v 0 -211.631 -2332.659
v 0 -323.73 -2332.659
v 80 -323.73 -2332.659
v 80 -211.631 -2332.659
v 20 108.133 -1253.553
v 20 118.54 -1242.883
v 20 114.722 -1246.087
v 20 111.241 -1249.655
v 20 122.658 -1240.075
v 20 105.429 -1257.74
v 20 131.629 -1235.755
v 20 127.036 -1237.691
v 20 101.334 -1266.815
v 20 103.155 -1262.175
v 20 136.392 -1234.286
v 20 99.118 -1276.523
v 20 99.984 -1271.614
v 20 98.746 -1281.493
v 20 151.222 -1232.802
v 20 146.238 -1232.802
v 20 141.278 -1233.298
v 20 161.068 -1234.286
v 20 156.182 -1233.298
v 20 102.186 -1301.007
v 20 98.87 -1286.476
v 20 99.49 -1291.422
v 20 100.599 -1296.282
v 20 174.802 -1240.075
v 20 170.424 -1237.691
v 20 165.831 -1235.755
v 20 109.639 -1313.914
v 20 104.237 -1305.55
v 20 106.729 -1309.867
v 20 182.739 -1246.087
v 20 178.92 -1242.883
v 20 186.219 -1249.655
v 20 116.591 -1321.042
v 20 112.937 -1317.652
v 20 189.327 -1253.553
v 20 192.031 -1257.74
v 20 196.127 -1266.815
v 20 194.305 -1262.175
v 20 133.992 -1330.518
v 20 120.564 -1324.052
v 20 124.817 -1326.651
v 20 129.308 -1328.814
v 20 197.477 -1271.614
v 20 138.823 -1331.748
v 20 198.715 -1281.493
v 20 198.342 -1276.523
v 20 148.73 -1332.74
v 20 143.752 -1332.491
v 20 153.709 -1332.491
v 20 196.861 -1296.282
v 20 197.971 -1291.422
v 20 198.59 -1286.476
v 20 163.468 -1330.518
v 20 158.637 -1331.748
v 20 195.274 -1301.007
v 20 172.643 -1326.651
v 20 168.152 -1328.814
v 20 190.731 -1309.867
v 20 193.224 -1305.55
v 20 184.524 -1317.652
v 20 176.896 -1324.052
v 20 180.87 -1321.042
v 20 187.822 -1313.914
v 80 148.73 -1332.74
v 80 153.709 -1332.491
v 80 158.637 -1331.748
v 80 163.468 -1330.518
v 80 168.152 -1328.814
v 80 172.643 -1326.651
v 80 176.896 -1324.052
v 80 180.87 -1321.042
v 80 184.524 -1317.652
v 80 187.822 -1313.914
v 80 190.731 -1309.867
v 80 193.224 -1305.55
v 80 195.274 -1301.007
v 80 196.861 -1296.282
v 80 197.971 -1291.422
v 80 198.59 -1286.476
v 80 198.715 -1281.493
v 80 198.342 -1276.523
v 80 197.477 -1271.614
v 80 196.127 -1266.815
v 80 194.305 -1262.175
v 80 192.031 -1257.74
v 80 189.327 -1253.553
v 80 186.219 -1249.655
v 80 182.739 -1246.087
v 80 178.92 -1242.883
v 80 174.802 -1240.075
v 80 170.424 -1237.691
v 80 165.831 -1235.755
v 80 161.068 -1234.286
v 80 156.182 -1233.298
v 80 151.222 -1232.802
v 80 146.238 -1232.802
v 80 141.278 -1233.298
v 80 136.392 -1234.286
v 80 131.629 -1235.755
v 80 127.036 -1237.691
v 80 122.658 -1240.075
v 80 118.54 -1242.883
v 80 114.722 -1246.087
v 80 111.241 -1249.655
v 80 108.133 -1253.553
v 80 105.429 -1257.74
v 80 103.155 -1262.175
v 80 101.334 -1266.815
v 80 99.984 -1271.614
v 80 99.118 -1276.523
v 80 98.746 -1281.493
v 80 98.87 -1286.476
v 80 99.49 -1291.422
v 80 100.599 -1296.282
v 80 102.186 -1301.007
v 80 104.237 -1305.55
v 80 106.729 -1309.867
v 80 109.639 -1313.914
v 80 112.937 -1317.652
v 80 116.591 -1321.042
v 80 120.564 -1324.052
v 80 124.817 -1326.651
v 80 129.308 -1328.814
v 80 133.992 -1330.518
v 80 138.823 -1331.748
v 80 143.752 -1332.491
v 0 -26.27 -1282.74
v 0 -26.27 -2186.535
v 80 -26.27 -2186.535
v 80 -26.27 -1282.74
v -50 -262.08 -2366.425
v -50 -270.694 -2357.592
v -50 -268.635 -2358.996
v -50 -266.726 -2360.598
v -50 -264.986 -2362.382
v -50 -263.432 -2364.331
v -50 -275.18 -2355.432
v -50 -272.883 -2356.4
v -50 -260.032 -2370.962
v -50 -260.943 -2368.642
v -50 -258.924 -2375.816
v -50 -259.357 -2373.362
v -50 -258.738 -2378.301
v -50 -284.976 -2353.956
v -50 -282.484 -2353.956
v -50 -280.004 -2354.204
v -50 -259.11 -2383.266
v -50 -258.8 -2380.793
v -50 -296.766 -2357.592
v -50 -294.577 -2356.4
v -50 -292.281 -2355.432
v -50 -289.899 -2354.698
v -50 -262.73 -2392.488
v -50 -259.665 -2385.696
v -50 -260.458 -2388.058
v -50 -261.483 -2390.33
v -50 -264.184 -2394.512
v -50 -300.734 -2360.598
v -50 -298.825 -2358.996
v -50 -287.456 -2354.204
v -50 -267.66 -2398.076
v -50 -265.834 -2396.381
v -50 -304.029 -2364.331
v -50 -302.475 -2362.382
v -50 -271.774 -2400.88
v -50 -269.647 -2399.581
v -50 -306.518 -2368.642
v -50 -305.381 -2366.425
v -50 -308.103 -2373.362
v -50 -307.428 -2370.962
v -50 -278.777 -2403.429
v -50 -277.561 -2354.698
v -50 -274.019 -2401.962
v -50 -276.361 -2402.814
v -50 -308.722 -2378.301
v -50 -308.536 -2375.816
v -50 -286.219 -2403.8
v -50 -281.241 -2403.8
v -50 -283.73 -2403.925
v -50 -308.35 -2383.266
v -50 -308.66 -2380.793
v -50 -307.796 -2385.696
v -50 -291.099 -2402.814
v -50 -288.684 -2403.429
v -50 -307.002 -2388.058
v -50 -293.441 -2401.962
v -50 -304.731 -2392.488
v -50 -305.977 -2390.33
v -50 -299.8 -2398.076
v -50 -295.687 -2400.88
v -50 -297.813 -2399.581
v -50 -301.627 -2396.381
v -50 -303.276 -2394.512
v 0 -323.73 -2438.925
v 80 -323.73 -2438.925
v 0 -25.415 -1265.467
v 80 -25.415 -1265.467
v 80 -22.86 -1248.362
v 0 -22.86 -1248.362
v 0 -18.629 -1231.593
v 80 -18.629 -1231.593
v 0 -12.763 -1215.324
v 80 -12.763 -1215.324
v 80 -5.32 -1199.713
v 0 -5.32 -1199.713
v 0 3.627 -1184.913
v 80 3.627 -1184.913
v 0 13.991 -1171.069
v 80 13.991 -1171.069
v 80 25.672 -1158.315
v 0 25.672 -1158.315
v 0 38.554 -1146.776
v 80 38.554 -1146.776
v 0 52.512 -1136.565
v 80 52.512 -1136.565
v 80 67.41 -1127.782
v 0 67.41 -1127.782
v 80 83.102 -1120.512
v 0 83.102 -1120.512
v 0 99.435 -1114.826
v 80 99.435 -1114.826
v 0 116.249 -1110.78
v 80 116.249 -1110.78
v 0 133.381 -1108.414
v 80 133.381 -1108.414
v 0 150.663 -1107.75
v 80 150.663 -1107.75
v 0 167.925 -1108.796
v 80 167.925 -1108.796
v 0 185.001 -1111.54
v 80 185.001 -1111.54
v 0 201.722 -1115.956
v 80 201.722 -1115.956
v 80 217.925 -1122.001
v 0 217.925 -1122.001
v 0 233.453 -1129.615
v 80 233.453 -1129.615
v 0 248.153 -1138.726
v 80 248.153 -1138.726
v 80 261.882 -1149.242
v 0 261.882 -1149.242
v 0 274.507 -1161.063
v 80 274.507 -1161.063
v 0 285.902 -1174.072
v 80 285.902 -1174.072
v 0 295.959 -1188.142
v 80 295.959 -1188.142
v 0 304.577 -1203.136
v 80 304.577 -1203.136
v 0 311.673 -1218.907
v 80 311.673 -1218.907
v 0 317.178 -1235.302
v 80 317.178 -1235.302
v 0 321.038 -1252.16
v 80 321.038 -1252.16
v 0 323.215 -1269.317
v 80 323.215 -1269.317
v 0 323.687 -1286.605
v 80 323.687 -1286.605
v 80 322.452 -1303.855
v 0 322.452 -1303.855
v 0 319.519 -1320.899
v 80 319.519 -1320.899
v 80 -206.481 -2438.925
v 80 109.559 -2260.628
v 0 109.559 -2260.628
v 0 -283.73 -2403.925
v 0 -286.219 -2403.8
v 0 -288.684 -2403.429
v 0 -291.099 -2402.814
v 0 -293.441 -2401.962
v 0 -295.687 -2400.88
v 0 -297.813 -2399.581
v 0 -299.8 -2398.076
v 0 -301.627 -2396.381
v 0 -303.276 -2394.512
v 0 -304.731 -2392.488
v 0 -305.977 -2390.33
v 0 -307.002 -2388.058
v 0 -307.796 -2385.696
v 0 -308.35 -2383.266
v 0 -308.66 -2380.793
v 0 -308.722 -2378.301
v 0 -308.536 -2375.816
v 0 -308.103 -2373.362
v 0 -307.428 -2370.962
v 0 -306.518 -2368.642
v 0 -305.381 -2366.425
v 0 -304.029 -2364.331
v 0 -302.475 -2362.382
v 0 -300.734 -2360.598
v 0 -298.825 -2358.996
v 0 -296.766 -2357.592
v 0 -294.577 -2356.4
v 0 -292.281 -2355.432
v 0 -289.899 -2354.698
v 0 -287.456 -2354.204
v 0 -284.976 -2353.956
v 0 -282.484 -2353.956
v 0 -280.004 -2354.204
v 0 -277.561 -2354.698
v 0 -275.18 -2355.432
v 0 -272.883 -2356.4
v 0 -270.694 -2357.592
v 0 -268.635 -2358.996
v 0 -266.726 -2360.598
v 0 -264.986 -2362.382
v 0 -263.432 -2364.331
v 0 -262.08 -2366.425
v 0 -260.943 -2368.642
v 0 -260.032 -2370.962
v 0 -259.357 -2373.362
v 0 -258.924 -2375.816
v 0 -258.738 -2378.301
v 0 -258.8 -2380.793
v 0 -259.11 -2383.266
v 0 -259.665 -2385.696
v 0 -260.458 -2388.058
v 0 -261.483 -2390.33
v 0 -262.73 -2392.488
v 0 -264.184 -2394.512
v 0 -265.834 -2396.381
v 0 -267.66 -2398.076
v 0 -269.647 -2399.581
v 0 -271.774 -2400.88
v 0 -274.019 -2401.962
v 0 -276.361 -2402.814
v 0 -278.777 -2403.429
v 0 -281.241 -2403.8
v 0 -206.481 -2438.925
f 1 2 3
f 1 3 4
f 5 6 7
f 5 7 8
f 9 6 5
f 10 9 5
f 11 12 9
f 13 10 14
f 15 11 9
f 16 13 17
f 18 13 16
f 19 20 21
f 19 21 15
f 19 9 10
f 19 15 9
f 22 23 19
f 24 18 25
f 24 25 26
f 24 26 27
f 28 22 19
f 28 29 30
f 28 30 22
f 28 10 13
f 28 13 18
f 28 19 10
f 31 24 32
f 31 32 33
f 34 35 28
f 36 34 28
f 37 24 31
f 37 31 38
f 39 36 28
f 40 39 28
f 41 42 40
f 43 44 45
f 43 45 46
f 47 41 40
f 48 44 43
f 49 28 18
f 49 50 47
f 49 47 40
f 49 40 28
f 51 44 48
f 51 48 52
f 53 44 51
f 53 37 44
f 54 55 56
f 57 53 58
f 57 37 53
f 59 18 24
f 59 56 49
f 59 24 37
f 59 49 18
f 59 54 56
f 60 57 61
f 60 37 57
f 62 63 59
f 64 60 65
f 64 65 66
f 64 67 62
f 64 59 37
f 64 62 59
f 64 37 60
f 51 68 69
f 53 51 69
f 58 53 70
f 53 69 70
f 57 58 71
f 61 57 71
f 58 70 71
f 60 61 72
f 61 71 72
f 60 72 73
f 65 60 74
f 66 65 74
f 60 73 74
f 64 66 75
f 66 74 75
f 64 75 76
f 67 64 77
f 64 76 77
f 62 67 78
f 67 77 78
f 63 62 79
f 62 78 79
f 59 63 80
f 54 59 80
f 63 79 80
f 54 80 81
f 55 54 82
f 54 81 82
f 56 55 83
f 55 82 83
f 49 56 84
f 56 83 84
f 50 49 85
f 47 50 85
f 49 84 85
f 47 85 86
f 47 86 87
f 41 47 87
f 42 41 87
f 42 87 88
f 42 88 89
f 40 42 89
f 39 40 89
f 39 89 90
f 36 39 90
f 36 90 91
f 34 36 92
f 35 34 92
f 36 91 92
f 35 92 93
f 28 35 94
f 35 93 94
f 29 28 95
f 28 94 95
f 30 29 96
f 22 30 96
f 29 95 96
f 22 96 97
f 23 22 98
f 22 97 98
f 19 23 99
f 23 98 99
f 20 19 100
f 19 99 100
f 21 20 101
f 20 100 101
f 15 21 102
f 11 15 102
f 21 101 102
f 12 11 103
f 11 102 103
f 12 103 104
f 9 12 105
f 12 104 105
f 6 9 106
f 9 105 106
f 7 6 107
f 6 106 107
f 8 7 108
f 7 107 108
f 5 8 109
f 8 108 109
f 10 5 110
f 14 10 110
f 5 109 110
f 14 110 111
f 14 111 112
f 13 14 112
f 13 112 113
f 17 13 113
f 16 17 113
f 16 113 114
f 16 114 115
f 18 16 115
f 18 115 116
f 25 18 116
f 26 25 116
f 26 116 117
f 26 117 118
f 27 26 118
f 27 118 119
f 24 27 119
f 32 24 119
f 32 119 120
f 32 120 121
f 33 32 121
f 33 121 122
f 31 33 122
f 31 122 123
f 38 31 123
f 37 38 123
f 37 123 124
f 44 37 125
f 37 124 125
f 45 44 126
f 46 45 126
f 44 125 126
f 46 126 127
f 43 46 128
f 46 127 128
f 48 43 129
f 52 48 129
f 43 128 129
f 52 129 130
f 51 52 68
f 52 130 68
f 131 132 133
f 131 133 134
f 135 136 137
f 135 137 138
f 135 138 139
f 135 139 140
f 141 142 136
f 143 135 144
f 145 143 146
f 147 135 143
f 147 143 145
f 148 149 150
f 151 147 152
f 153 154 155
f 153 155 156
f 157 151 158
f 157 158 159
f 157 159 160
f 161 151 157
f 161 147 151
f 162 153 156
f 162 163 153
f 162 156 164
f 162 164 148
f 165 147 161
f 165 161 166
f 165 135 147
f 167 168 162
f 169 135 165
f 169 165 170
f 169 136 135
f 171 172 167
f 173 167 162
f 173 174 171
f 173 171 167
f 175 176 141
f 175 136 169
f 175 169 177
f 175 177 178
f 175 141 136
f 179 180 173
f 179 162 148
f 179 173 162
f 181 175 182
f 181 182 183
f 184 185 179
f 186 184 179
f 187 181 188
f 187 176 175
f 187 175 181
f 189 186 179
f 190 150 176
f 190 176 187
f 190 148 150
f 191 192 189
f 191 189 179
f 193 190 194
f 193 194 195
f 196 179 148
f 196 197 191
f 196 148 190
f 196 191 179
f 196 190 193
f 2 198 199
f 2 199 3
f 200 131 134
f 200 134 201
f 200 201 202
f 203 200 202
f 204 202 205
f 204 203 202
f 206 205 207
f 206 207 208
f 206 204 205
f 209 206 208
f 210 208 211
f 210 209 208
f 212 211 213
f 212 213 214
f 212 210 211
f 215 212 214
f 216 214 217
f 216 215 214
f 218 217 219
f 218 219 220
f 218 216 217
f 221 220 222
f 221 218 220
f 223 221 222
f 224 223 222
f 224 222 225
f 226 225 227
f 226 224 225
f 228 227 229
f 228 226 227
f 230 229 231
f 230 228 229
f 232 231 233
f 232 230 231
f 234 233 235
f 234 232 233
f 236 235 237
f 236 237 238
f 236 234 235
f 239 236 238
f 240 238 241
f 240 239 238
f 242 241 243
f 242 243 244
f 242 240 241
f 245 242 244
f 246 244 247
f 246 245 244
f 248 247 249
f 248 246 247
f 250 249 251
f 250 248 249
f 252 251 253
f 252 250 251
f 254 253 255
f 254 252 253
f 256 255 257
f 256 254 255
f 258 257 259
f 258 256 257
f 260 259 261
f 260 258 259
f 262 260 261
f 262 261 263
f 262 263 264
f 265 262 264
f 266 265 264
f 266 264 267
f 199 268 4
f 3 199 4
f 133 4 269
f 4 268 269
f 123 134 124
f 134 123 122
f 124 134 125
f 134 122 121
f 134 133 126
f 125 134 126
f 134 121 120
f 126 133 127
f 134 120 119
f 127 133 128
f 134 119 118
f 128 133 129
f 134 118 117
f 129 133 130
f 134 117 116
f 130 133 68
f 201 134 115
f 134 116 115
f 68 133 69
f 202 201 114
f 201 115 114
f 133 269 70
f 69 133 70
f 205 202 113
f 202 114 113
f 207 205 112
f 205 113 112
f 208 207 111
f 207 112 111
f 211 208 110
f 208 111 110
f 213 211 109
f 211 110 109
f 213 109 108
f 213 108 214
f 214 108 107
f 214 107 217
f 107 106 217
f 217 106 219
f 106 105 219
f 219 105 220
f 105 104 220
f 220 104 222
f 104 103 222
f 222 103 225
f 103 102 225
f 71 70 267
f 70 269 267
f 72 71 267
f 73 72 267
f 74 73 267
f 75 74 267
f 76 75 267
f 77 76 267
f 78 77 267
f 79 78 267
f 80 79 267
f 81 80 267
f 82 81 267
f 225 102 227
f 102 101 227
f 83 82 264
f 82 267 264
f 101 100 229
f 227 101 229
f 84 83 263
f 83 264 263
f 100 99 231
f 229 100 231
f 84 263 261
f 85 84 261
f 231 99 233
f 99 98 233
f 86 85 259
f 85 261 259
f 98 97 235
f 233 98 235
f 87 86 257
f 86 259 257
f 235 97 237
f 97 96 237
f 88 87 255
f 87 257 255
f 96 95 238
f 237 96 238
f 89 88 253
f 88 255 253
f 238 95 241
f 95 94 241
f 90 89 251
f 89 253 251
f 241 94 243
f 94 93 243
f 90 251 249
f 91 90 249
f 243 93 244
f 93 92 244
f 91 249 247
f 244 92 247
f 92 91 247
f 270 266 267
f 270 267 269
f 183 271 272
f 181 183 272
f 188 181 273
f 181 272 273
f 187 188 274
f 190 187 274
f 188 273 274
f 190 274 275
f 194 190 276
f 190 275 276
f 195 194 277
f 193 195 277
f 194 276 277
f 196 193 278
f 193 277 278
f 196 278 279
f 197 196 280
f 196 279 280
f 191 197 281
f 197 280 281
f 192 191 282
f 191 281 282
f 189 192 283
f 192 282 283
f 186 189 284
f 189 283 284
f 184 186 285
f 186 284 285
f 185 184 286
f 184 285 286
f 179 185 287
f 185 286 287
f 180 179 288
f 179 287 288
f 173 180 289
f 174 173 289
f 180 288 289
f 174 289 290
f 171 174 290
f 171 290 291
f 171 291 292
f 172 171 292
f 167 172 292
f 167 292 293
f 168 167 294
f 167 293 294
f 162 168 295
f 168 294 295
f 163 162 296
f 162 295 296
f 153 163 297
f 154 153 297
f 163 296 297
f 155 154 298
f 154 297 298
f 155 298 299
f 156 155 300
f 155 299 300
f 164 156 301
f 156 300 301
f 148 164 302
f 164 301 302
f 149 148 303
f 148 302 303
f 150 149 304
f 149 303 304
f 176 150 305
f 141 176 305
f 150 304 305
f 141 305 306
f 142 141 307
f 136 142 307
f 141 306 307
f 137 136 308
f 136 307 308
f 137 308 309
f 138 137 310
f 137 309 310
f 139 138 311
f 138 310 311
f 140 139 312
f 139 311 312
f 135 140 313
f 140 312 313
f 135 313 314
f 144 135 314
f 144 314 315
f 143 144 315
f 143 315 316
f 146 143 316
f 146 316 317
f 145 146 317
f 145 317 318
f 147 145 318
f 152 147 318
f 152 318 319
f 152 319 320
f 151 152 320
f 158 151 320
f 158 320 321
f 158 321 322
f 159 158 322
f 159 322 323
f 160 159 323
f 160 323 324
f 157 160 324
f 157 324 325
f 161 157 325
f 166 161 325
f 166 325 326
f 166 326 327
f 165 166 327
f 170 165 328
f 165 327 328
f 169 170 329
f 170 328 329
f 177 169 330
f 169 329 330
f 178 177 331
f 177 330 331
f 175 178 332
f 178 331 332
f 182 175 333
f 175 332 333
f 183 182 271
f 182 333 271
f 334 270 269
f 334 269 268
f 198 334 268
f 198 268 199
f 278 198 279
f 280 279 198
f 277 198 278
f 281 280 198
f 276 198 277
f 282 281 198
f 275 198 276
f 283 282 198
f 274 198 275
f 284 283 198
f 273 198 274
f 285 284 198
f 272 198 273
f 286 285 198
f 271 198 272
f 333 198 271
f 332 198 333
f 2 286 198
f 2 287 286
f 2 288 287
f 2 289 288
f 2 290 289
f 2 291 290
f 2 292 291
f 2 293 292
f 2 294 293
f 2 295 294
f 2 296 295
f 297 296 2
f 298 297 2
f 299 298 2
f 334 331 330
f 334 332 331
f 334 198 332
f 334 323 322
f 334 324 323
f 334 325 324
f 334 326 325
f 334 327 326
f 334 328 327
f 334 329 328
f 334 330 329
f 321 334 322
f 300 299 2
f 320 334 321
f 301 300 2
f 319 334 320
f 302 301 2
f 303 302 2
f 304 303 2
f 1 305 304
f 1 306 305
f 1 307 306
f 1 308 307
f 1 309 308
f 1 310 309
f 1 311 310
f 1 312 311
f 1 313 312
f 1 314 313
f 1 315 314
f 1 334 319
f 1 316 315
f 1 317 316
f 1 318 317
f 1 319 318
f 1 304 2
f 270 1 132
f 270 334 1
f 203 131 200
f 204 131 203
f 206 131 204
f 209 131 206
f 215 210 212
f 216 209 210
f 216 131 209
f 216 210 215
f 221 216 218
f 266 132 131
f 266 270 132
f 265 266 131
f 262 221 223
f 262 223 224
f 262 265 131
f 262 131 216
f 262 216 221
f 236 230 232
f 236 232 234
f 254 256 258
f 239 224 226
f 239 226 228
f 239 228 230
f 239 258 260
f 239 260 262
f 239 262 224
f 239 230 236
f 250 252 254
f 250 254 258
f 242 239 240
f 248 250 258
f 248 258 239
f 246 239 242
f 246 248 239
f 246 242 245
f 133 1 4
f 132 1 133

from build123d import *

# Parameters (mm, degrees)
BOSS_EXTRUDE3_DEPTH = 80
SKETCH6_R           = 50
CUT_EXTRUDE2_DEPTH  = 60
SKETCH7_R           = 25
BOSS_EXTRUDE4_DEPTH = 50


with BuildPart() as part:
    # Sketch4 → Boss-Extrude3 (new body)
    with BuildSketch(Plane(origin=(0, 0, 0), x_dir=(0, 0, -1), z_dir=(1, 0, 0))):
        with BuildLine():
            Line((1320.898617495, 319.519232733), (2260.627548778, 109.558564747))
            Line((2260.627548778, 109.558564747), (2438.924606228, -206.480811367))
            Line((2438.924606228, -206.480811367), (2438.924606228, -323.730177318))
            Line((2438.924606228, -323.730177318), (2332.658891416, -323.730177318))
            Line((2332.658891416, -323.730177318), (2332.658891416, -211.630732545))
            Line((2332.658891416, -211.630732545), (2186.534815531, -26.269822682))
            Line((2186.534815531, -26.269822682), (1282.739758098, -26.269822682))
            ThreePointArc((1282.739758098, -26.269822682), (1108.795679875, 167.925428064), (1320.898617495, 319.519232733))
        make_face()
    extrude(amount=BOSS_EXTRUDE3_DEPTH)

    # Sketch6 → Cut-Extrude2 (cut)
    with BuildSketch(Plane(origin=(80, 0, 0), x_dir=(0, 0, -1), z_dir=(1, 0, 0))):
        with Locations((1282.739758098, 148.730177318)):
            Circle(SKETCH6_R)
    extrude(amount=-CUT_EXTRUDE2_DEPTH, mode=Mode.SUBTRACT)

    # Sketch7 → Boss-Extrude4 (add)
    with BuildSketch(Plane.ZY):
        with Locations(Location((-2378.924606228, -283.730177318, 0), (0, 0, 180))):
            Circle(SKETCH7_R)
    extrude(amount=BOSS_EXTRUDE4_DEPTH)


solid = part.part
